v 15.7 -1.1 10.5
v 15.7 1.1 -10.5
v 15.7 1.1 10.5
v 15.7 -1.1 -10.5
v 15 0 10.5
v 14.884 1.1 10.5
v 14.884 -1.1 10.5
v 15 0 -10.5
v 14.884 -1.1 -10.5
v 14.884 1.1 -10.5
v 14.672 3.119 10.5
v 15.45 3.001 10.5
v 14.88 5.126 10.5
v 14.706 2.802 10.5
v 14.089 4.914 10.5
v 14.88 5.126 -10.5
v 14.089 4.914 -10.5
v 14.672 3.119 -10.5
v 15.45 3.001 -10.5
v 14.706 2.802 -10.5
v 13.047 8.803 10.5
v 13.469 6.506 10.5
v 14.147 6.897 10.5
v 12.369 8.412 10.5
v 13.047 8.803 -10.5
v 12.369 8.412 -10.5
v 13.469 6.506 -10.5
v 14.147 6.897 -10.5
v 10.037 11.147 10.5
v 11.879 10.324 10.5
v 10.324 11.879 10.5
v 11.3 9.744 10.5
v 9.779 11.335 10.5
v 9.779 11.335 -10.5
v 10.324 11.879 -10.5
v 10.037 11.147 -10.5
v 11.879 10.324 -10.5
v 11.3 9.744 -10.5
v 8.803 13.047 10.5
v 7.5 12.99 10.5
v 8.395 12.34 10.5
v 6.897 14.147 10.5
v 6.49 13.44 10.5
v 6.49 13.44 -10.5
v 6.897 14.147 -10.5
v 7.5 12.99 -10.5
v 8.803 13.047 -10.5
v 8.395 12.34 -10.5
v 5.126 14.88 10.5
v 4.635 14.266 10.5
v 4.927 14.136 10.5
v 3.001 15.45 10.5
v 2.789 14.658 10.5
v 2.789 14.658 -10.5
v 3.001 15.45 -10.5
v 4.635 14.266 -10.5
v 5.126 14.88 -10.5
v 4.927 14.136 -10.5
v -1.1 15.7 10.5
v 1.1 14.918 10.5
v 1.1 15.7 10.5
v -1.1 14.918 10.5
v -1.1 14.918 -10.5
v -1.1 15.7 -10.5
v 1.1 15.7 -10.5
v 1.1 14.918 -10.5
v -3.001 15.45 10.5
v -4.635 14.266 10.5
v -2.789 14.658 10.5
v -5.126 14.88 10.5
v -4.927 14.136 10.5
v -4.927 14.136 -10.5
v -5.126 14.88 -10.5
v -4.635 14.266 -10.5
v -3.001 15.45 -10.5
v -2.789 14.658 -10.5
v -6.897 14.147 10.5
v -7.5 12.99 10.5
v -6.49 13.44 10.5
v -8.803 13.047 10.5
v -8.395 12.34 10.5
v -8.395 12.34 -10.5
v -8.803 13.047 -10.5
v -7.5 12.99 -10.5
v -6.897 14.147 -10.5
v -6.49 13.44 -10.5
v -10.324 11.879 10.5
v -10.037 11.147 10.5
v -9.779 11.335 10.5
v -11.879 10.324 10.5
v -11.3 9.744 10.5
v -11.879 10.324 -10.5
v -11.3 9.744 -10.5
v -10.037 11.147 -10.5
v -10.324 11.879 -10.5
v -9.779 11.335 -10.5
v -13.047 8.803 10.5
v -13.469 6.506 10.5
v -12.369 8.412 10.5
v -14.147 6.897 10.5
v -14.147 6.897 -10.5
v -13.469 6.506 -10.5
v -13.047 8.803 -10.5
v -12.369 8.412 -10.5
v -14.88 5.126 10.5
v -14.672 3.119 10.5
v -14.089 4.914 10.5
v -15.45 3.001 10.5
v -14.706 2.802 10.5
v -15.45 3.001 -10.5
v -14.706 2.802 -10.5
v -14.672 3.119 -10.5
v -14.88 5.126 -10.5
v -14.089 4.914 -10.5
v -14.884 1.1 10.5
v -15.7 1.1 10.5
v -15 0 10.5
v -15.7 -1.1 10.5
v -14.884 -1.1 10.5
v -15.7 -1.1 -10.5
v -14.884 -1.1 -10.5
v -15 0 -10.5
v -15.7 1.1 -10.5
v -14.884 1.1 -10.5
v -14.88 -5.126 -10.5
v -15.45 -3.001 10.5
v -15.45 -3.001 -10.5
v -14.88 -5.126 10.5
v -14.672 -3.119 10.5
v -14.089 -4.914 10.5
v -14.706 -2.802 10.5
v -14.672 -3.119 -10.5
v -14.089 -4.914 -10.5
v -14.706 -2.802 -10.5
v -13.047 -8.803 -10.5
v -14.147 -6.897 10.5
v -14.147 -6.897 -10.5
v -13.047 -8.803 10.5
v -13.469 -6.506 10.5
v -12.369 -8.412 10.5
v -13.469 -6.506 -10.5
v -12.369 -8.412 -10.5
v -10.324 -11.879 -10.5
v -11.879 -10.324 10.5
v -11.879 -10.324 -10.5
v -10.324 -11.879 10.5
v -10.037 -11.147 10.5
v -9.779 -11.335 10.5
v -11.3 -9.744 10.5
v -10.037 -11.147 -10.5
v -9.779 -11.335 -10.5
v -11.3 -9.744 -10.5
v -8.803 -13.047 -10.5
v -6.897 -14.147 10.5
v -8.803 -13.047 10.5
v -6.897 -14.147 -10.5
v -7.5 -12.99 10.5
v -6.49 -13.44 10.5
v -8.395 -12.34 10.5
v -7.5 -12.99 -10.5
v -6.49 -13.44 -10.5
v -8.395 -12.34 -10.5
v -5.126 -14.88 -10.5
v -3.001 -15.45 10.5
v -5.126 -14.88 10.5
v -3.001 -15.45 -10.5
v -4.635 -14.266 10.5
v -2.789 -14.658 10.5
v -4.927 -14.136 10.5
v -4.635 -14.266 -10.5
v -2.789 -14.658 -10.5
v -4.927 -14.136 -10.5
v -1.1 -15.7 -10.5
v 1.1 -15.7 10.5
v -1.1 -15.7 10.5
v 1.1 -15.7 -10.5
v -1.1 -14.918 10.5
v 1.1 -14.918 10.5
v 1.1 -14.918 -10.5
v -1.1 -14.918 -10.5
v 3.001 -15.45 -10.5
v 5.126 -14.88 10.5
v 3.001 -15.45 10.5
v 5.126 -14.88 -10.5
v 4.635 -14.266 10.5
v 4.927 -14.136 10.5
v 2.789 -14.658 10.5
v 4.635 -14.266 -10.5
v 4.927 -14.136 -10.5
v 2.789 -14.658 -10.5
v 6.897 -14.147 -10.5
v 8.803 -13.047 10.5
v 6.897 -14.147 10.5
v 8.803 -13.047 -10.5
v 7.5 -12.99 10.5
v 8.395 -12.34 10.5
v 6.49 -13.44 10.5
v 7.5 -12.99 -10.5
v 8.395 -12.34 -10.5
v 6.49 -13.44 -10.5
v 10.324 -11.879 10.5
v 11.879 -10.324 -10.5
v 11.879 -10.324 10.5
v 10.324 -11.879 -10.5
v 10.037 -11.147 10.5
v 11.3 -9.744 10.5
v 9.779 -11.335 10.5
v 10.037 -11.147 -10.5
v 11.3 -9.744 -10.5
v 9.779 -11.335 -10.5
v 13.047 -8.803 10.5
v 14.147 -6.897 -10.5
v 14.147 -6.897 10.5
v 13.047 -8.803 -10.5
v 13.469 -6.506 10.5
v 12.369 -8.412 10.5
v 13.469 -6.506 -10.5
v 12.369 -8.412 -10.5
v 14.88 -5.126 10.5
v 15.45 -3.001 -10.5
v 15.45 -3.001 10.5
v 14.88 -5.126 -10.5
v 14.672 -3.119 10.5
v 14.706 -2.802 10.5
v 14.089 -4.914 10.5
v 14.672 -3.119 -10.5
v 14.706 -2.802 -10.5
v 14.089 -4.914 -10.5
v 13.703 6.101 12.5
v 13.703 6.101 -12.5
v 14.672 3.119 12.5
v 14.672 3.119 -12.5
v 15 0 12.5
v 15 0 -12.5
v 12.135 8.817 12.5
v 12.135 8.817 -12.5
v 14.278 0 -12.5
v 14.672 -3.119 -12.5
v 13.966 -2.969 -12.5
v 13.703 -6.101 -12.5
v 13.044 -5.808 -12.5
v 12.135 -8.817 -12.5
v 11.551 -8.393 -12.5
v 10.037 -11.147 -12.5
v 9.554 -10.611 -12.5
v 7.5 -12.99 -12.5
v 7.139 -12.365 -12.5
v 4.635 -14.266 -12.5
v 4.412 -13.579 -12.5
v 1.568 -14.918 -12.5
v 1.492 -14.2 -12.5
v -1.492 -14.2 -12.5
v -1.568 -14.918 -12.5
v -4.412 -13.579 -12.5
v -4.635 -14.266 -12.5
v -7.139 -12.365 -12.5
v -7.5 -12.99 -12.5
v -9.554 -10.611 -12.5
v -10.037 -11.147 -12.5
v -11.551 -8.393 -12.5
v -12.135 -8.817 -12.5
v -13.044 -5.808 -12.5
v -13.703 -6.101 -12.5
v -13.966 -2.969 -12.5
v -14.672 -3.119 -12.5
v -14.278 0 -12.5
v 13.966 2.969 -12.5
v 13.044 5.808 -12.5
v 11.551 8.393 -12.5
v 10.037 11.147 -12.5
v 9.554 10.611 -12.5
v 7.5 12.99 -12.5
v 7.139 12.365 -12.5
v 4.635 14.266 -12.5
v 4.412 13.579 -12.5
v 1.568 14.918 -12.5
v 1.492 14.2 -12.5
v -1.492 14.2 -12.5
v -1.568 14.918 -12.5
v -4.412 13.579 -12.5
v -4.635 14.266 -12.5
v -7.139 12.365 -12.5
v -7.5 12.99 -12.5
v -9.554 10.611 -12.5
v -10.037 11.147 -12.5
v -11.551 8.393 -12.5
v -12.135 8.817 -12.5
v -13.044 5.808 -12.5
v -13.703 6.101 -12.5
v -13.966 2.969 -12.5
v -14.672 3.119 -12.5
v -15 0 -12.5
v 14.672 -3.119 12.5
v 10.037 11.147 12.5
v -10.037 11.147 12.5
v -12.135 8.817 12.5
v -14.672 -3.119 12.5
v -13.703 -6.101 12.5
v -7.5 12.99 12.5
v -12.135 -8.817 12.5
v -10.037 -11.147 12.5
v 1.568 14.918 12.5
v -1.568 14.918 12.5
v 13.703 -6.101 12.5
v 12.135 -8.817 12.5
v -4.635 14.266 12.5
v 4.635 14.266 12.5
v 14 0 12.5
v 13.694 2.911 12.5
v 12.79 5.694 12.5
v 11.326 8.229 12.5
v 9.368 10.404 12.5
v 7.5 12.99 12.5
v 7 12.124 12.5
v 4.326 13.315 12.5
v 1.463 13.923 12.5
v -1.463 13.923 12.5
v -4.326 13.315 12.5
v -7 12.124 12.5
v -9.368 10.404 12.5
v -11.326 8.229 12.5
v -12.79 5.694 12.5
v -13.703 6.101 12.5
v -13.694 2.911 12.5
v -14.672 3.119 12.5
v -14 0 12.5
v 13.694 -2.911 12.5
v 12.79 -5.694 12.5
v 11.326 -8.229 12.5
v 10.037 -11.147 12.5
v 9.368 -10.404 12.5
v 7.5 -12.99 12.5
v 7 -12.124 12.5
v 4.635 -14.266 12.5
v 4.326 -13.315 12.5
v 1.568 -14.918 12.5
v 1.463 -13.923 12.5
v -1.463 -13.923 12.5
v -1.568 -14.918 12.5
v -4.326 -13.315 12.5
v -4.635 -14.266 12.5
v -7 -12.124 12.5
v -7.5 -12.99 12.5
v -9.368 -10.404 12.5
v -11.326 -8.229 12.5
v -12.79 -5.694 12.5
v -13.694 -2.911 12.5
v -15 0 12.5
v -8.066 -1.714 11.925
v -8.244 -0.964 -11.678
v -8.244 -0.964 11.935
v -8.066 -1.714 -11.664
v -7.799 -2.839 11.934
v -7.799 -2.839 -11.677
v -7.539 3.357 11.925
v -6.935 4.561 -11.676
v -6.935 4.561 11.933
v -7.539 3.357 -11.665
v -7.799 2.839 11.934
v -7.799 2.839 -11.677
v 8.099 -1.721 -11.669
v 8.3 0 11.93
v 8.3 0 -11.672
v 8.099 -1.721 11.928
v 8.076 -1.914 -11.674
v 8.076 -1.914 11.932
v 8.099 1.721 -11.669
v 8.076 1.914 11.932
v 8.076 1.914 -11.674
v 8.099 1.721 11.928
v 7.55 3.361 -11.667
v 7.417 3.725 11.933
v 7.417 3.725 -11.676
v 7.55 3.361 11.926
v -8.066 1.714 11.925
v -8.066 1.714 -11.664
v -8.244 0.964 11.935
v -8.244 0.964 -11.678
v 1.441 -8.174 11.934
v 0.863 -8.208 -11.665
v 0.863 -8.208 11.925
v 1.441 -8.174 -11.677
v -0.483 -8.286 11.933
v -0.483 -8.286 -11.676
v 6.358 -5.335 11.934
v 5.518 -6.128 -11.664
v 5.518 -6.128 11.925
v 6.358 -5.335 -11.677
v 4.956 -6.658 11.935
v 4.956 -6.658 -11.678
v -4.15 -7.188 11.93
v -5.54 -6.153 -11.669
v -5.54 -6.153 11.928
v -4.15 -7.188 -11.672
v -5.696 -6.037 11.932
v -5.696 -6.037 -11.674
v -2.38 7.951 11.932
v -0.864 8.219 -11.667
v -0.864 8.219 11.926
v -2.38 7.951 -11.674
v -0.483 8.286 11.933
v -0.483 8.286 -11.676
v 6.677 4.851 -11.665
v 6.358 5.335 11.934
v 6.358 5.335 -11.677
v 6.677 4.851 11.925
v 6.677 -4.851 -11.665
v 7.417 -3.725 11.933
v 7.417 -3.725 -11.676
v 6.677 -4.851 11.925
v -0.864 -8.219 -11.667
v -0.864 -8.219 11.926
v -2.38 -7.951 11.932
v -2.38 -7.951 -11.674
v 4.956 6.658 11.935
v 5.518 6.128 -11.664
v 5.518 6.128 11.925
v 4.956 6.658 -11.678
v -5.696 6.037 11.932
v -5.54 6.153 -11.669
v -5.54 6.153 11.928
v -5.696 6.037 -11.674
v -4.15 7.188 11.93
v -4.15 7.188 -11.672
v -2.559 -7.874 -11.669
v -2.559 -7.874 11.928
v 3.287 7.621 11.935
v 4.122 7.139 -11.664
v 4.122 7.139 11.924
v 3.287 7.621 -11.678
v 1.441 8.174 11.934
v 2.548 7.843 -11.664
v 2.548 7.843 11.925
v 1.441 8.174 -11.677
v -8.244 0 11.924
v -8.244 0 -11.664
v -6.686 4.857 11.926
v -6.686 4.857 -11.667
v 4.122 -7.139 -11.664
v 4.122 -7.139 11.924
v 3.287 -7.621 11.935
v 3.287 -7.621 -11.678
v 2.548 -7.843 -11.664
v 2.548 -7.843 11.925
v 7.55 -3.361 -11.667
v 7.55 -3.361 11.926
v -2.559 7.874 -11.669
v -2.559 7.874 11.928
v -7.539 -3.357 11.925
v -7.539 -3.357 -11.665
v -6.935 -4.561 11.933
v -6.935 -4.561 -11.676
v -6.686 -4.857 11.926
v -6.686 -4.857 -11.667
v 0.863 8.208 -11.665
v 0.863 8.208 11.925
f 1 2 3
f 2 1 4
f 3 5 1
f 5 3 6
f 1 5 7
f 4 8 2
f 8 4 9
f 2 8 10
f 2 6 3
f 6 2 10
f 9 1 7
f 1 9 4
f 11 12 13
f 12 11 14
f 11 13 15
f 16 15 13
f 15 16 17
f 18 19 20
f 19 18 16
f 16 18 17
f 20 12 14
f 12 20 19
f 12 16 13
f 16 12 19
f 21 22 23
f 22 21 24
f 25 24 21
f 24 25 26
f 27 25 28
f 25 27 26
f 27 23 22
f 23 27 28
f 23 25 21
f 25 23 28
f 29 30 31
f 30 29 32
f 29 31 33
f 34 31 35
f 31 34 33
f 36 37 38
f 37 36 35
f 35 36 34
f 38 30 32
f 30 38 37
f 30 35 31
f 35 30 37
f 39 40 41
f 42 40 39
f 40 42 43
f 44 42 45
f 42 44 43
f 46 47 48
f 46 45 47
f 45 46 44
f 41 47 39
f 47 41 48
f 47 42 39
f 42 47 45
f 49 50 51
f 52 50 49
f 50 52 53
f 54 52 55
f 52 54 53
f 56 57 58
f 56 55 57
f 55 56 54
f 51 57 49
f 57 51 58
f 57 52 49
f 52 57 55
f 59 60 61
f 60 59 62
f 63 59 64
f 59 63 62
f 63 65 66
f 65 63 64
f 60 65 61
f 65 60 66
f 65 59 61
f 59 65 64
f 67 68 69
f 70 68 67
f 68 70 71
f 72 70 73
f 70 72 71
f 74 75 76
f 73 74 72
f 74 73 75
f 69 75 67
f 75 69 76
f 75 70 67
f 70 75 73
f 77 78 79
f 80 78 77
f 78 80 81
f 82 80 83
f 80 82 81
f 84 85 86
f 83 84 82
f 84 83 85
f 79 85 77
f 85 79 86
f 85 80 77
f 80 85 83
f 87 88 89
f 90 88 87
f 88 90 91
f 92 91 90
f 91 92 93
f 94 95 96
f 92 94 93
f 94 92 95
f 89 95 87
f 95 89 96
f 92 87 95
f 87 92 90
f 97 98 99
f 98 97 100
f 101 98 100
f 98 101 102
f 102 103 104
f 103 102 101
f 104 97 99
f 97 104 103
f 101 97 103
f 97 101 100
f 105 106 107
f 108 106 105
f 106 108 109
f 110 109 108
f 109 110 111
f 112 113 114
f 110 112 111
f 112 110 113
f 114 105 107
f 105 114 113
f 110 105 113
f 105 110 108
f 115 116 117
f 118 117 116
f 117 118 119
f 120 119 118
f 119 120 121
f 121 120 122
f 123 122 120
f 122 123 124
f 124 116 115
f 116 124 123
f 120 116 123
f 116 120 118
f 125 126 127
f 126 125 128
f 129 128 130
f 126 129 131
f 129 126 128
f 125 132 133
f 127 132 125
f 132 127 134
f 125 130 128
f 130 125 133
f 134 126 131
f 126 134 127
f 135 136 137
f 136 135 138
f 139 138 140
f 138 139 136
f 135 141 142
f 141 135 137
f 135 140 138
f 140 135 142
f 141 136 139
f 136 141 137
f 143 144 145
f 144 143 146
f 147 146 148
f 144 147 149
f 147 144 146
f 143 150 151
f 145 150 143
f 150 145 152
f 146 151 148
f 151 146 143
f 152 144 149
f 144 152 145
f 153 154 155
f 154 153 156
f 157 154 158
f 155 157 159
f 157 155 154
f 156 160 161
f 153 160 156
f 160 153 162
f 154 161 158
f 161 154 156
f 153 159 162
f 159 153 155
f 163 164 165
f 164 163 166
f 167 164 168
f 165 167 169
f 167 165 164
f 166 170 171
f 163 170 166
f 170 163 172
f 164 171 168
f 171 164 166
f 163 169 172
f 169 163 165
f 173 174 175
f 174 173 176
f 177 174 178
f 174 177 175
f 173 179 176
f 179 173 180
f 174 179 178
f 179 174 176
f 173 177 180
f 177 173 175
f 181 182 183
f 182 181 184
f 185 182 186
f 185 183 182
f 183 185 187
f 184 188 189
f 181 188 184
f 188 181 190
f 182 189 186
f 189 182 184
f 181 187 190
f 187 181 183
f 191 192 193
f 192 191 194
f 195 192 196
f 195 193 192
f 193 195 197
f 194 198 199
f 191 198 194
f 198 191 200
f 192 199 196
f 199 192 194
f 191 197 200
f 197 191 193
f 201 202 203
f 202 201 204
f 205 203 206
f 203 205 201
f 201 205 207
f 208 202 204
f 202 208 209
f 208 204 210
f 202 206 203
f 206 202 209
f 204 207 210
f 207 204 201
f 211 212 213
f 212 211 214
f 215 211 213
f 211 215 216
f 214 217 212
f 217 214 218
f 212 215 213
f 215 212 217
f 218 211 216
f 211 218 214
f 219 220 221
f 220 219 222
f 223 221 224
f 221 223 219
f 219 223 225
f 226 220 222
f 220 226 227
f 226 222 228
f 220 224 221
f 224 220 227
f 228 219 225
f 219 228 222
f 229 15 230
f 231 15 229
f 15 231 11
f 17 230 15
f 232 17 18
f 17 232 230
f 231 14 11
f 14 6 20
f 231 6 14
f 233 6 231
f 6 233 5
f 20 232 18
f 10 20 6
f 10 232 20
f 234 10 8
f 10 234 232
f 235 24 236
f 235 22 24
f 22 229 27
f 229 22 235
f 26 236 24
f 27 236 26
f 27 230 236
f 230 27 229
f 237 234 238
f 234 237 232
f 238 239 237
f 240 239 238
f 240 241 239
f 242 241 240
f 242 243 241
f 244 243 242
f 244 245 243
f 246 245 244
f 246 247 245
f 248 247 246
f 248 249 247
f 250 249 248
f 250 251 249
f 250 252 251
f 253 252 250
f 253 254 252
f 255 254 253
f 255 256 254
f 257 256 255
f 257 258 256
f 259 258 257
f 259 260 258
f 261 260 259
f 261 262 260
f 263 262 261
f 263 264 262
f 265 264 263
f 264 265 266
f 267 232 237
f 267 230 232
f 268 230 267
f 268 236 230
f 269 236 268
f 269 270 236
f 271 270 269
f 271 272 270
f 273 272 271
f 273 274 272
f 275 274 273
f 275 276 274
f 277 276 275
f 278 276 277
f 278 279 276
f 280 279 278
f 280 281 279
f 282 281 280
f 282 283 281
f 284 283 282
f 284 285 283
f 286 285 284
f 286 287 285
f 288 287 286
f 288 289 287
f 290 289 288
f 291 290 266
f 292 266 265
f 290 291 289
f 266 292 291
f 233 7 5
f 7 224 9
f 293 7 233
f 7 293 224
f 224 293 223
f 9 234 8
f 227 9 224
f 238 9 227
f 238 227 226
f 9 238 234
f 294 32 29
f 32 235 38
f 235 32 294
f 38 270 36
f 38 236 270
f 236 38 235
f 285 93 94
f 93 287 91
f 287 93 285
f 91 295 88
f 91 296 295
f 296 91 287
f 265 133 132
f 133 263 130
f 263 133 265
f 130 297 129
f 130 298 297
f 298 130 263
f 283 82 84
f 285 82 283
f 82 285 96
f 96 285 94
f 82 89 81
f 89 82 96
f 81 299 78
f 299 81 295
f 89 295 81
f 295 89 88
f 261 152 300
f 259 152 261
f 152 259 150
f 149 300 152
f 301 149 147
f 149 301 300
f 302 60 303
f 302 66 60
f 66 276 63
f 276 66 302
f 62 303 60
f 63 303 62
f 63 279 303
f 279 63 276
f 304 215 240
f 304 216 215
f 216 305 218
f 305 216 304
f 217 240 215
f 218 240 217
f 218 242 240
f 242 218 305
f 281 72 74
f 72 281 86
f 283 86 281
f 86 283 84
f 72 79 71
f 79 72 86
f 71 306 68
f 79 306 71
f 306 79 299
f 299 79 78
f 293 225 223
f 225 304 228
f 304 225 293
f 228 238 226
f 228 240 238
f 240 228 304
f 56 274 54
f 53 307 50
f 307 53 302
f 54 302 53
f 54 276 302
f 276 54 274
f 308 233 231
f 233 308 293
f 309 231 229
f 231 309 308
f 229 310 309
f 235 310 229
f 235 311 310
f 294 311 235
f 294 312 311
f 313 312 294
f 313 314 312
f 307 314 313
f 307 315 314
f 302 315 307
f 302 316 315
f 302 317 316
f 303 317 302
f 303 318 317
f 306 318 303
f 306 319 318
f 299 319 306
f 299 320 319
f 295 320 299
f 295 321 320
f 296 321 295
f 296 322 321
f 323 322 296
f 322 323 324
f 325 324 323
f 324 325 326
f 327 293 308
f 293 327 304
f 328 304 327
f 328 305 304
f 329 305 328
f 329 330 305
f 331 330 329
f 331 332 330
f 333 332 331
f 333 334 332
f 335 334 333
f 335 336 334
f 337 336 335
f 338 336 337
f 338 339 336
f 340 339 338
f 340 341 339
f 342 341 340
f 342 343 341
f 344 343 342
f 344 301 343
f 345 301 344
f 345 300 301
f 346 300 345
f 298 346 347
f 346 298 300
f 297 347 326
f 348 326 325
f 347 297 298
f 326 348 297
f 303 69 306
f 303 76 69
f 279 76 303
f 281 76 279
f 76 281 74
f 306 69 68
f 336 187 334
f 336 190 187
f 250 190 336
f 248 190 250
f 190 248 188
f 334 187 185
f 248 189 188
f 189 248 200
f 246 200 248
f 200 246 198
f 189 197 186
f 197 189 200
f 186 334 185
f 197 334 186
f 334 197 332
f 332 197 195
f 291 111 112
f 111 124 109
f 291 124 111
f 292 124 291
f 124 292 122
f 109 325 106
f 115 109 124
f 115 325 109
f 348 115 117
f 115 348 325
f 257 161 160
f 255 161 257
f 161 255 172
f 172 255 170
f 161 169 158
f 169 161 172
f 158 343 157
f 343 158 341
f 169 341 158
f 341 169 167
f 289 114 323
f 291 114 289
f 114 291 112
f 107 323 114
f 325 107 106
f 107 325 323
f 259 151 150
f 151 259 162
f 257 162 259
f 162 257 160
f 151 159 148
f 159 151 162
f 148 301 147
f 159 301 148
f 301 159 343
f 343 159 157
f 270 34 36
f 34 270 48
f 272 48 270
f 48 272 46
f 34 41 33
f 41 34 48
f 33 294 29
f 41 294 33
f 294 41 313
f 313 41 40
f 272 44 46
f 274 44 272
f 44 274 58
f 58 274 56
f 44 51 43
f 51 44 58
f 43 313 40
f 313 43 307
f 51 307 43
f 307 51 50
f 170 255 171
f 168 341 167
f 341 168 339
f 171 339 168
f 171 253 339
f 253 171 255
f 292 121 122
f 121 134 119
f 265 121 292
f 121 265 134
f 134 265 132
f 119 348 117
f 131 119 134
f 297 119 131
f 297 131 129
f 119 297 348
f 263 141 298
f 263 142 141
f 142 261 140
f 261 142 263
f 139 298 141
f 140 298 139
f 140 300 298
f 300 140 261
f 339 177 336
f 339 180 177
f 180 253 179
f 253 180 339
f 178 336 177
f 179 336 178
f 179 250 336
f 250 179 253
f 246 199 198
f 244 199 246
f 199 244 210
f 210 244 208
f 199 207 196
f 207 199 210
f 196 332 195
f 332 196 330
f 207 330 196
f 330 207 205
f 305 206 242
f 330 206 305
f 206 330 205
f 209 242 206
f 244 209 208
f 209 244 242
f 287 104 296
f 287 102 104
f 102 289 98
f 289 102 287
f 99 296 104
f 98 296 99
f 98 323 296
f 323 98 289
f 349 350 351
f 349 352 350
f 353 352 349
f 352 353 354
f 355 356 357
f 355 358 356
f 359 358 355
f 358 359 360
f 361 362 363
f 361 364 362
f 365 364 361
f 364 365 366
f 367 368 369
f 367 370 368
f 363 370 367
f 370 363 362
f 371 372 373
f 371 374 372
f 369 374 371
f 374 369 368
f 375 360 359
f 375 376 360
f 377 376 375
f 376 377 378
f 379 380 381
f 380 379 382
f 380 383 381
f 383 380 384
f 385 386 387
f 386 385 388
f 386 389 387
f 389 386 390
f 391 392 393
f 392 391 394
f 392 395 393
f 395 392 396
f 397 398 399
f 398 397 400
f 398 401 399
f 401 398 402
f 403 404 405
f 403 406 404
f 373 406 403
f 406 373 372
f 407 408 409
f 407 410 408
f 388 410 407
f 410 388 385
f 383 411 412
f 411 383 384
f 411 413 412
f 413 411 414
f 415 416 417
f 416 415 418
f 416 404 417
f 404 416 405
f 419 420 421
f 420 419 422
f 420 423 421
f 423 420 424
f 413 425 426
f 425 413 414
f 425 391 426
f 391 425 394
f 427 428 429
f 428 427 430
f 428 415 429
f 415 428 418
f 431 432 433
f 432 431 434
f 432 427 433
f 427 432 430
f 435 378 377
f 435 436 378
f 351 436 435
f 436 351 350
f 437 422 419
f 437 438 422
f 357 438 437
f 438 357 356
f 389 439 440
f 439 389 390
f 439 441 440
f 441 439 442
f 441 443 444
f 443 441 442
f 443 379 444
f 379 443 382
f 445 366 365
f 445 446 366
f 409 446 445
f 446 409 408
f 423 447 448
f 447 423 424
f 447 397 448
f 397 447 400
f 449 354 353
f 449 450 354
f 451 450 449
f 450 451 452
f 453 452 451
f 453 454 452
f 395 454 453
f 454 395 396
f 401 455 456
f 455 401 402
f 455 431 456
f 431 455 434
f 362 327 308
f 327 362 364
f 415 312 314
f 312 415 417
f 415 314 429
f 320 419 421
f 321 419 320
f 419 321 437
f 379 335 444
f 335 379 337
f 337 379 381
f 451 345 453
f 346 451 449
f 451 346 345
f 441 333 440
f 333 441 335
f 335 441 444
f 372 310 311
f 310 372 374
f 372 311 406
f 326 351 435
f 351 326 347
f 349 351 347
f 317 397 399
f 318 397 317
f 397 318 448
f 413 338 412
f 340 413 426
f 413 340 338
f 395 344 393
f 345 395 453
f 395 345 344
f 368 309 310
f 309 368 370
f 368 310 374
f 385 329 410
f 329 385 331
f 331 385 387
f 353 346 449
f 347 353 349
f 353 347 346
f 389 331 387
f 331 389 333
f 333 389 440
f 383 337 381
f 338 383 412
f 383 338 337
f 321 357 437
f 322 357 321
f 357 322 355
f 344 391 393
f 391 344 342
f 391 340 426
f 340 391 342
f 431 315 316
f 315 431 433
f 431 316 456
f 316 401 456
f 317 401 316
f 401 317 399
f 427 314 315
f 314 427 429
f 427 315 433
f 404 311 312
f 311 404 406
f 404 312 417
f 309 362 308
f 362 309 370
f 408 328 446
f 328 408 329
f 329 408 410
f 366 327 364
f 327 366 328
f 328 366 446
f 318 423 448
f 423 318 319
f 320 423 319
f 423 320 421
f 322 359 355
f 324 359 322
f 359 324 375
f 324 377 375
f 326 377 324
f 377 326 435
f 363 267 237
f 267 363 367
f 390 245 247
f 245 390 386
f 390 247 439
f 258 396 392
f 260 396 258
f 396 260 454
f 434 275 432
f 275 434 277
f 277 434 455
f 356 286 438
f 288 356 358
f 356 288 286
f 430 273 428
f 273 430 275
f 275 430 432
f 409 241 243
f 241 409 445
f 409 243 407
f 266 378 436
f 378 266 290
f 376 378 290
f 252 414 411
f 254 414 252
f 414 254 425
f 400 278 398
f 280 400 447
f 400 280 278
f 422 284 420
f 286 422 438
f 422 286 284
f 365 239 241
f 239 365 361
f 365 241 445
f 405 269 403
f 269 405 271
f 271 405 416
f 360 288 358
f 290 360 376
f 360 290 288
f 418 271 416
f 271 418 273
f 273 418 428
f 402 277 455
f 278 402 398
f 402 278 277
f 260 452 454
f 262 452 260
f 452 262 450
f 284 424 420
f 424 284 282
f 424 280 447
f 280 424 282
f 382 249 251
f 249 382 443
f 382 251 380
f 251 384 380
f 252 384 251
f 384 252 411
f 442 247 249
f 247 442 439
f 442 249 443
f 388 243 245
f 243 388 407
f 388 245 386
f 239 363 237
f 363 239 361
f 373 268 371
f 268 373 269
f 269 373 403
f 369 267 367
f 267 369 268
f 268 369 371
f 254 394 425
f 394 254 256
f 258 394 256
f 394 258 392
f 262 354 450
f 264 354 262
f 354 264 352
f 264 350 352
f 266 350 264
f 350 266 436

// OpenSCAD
// Parameters
insert_outer_diameter_mm = 30; //[15:60:0.5]
insert_length_mm = 25; //[12.5:50:0.5]
screw_nominal_diameter_mm = 16; //[8:32:0.5]
internal_thread_clearance_mm = 0.6; //[0.2:1.5:0.1]
outer_rib_count = 24; //[8:60:1]
outer_rib_radial_height_mm = 1.2; //[0.4:3:0.1]
outer_rib_tangential_width_mm = 2.2; //[0.8:5:0.1]
outer_rib_length_mm = 21; //[10:45:0.5]
entry_chamfer_angle_deg = 45; //[15:75:1]
tip_chamfer_angle_deg = 30; //[15:75:1]
entry_chamfer_radial_mm = 1.5; //[0.5:4:0.1]
tip_chamfer_radial_mm = 1.2; //[0.5:4:0.1]
bore_entry_chamfer_radial_mm = 1; //[0.3:3:0.1]
bore_tip_chamfer_radial_mm = 0.8; //[0.3:3:0.1]
connect_overlap_mm = 1; //[0.5:2:0.1]
eps_mm = 0.2; //[0.05:0.5:0.05]

// M16x30 Insert - complete geometry
module insert() {
  color("Silver") {
    difference() {
      union() {
        // Main body
        cylinder(r=insert_outer_diameter_mm/2, h=insert_length_mm, center=true);
        
        // Outer ribs
        for (i = [0:outer_rib_count-1]) {
          rotate([0, 0, i*360/outer_rib_count]) {
            translate([insert_outer_diameter_mm/2 + outer_rib_radial_height_mm/2 - connect_overlap_mm, 0, 0]) {
              cube([outer_rib_radial_height_mm + connect_overlap_mm, outer_rib_tangential_width_mm, outer_rib_length_mm], center=true);
            }
          }
        }
      }
      
      // Internal bore
      cylinder(r=(screw_nominal_diameter_mm + internal_thread_clearance_mm)/2, h=insert_length_mm + 2*eps_mm, center=true);
      
      // Entry chamfer
      translate([0, 0, insert_length_mm/2 - (entry_chamfer_radial_mm / tan(entry_chamfer_angle_deg)) / 2 + eps_mm/2]) {
        rotate([180, 0, 0]) {
          cylinder(r1=insert_outer_diameter_mm/2, r2=0, h=entry_chamfer_radial_mm / tan(entry_chamfer_angle_deg), center=true);
        }
      }
      
      // Tip chamfer
      translate([0, 0, -insert_length_mm/2 + (tip_chamfer_radial_mm / tan(tip_chamfer_angle_deg)) / 2 - eps_mm/2]) {
        cylinder(r1=insert_outer_diameter_mm/2, r2=0, h=tip_chamfer_radial_mm / tan(tip_chamfer_angle_deg), center=true);
      }
      
      // Bore entry chamfer
      translate([0, 0, insert_length_mm/2 - (bore_entry_chamfer_radial_mm / tan(entry_chamfer_angle_deg)) / 2 + eps_mm/2]) {
        rotate([180, 0, 0]) {
          cylinder(r1=(screw_nominal_diameter_mm + internal_thread_clearance_mm)/2 + bore_entry_chamfer_radial_mm, r2=0, h=bore_entry_chamfer_radial_mm / tan(entry_chamfer_angle_deg), center=true);
        }
      }
      
      // Bore tip chamfer
      translate([0, 0, -insert_length_mm/2 + (bore_tip_chamfer_radial_mm / tan(tip_chamfer_angle_deg)) / 2 - eps_mm/2]) {
        cylinder(r1=(screw_nominal_diameter_mm + internal_thread_clearance_mm)/2 + bore_tip_chamfer_radial_mm, r2=0, h=bore_tip_chamfer_radial_mm / tan(tip_chamfer_angle_deg), center=true);
      }
    }
  }
}

// Threaded Insert - complete geometry
module threaded_insert() {
  insert();
}

// Assembly
module assembly() {
  threaded_insert();
}

assembly();
